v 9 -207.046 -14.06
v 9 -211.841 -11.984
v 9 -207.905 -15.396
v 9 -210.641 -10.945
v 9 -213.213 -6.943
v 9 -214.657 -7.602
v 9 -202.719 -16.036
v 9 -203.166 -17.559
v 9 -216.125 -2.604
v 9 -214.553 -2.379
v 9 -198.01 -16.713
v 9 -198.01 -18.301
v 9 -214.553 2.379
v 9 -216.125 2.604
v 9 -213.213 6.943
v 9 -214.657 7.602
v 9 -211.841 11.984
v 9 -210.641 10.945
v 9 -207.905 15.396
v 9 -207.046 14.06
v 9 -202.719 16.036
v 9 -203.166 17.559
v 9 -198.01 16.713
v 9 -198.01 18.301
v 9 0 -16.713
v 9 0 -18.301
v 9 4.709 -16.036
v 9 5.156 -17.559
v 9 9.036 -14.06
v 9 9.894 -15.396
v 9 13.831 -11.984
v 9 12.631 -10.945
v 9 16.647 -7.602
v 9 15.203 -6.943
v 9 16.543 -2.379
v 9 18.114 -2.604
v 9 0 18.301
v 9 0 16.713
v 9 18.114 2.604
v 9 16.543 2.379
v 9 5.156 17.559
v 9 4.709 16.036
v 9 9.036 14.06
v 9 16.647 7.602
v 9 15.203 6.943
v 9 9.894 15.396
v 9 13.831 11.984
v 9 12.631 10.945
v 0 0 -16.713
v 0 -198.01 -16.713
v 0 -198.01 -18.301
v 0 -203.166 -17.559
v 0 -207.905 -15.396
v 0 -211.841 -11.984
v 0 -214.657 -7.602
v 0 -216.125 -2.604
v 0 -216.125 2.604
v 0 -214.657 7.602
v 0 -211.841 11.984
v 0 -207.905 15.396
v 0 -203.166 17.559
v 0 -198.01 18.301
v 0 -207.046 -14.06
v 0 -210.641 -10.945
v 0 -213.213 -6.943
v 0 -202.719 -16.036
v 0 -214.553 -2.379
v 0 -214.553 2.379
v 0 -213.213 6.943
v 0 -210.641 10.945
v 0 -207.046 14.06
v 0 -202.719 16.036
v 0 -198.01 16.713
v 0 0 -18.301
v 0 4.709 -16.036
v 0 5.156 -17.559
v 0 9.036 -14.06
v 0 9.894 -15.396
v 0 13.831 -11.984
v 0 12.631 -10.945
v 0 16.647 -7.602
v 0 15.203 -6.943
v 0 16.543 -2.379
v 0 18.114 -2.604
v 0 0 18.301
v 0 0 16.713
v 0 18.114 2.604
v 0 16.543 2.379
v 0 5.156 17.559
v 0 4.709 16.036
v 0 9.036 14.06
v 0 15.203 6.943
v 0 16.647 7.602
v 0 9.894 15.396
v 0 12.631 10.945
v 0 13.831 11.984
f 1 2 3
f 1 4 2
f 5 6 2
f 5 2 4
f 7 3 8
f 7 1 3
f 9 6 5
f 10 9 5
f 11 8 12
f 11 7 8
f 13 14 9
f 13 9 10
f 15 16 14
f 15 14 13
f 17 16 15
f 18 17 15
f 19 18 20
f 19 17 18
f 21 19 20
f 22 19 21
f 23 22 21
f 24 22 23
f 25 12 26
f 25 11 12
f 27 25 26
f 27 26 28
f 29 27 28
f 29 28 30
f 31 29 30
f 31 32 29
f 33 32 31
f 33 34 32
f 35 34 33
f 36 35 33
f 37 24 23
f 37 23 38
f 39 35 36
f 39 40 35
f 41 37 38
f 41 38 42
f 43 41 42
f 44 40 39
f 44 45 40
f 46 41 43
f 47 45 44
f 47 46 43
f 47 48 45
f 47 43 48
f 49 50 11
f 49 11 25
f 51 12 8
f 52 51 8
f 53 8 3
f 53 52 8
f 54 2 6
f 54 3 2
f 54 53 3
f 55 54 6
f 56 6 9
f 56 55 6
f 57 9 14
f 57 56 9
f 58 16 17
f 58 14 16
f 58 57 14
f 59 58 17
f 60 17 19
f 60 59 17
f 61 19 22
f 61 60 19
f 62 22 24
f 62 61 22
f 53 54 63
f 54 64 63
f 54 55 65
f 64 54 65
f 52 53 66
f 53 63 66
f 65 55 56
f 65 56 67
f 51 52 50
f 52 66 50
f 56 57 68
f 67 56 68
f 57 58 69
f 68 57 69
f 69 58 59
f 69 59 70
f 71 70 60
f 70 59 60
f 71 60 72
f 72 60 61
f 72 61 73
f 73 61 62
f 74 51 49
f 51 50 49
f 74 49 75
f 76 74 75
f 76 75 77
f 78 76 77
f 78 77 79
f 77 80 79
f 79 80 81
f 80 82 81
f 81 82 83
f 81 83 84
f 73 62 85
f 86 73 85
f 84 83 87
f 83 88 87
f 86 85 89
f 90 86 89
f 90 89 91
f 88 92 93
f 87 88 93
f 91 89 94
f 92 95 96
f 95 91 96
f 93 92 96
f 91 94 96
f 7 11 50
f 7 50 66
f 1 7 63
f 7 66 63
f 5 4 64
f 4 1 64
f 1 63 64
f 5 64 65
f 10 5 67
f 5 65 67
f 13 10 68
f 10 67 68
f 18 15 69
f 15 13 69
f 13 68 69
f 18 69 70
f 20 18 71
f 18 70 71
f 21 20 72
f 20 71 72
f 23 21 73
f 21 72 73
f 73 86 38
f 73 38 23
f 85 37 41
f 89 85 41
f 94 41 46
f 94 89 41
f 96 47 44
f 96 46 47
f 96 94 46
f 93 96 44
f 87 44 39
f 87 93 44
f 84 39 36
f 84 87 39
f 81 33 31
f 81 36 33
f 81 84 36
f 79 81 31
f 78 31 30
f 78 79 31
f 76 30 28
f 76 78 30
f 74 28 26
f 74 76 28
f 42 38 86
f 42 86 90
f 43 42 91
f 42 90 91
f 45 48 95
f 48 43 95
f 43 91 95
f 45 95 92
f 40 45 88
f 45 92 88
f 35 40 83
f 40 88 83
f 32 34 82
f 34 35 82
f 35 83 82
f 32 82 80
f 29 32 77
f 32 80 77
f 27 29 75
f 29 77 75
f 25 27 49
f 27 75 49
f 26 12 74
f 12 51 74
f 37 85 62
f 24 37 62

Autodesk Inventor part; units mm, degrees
ref_plane "YZ Plane" through (0, 0, 0) normal (1, 0, 0) x (0, 1, 0)
ref_plane "XZ Plane" through (0, 0, 0) normal (0, 1, 0) x (-1, 0, 0)
ref_plane "XY Plane" through (0, 0, 0) normal (0, 0, 1) x (1, 0, 0)
sketch "Sketch1" plane through (0, 0, 0) normal (1, 0, 0) x (0, 1, 0)
  arc A0 (0, -16.7132) -> (0, 16.7132) centre (0, 0) ccw
  arc A1 (-198.0104, 16.7132) -> (-198.0104, -16.7132) centre (-198.0104, 0) ccw
  line L0 (0, 16.7132) -> (-198.0104, 16.7132)
  line L1 (-198.0104, -16.7132) -> (0, -16.7132)
  arc A2 (-198.0104, 18.3007) -> (-198.0104, -18.3007) centre (-198.0104, 0) ccw
  line L2 (-198.0104, -18.3007) -> (0, -18.3007)
  arc A3 (0, -18.3007) -> (0, 18.3007) centre (0, 0) ccw
  line L3 (0, 18.3007) -> (-198.0104, 18.3007)
  dimension "d0" = 16.7132
  dimension "d1" = 198.0104
  dimension "d2" = 1.5875
extrude "Extrusion1" add sketch "Sketch1" along normal blind 9
properties part number "STANDIN,BELT,100T,HTD5mm" material "Nylon 6/6"
